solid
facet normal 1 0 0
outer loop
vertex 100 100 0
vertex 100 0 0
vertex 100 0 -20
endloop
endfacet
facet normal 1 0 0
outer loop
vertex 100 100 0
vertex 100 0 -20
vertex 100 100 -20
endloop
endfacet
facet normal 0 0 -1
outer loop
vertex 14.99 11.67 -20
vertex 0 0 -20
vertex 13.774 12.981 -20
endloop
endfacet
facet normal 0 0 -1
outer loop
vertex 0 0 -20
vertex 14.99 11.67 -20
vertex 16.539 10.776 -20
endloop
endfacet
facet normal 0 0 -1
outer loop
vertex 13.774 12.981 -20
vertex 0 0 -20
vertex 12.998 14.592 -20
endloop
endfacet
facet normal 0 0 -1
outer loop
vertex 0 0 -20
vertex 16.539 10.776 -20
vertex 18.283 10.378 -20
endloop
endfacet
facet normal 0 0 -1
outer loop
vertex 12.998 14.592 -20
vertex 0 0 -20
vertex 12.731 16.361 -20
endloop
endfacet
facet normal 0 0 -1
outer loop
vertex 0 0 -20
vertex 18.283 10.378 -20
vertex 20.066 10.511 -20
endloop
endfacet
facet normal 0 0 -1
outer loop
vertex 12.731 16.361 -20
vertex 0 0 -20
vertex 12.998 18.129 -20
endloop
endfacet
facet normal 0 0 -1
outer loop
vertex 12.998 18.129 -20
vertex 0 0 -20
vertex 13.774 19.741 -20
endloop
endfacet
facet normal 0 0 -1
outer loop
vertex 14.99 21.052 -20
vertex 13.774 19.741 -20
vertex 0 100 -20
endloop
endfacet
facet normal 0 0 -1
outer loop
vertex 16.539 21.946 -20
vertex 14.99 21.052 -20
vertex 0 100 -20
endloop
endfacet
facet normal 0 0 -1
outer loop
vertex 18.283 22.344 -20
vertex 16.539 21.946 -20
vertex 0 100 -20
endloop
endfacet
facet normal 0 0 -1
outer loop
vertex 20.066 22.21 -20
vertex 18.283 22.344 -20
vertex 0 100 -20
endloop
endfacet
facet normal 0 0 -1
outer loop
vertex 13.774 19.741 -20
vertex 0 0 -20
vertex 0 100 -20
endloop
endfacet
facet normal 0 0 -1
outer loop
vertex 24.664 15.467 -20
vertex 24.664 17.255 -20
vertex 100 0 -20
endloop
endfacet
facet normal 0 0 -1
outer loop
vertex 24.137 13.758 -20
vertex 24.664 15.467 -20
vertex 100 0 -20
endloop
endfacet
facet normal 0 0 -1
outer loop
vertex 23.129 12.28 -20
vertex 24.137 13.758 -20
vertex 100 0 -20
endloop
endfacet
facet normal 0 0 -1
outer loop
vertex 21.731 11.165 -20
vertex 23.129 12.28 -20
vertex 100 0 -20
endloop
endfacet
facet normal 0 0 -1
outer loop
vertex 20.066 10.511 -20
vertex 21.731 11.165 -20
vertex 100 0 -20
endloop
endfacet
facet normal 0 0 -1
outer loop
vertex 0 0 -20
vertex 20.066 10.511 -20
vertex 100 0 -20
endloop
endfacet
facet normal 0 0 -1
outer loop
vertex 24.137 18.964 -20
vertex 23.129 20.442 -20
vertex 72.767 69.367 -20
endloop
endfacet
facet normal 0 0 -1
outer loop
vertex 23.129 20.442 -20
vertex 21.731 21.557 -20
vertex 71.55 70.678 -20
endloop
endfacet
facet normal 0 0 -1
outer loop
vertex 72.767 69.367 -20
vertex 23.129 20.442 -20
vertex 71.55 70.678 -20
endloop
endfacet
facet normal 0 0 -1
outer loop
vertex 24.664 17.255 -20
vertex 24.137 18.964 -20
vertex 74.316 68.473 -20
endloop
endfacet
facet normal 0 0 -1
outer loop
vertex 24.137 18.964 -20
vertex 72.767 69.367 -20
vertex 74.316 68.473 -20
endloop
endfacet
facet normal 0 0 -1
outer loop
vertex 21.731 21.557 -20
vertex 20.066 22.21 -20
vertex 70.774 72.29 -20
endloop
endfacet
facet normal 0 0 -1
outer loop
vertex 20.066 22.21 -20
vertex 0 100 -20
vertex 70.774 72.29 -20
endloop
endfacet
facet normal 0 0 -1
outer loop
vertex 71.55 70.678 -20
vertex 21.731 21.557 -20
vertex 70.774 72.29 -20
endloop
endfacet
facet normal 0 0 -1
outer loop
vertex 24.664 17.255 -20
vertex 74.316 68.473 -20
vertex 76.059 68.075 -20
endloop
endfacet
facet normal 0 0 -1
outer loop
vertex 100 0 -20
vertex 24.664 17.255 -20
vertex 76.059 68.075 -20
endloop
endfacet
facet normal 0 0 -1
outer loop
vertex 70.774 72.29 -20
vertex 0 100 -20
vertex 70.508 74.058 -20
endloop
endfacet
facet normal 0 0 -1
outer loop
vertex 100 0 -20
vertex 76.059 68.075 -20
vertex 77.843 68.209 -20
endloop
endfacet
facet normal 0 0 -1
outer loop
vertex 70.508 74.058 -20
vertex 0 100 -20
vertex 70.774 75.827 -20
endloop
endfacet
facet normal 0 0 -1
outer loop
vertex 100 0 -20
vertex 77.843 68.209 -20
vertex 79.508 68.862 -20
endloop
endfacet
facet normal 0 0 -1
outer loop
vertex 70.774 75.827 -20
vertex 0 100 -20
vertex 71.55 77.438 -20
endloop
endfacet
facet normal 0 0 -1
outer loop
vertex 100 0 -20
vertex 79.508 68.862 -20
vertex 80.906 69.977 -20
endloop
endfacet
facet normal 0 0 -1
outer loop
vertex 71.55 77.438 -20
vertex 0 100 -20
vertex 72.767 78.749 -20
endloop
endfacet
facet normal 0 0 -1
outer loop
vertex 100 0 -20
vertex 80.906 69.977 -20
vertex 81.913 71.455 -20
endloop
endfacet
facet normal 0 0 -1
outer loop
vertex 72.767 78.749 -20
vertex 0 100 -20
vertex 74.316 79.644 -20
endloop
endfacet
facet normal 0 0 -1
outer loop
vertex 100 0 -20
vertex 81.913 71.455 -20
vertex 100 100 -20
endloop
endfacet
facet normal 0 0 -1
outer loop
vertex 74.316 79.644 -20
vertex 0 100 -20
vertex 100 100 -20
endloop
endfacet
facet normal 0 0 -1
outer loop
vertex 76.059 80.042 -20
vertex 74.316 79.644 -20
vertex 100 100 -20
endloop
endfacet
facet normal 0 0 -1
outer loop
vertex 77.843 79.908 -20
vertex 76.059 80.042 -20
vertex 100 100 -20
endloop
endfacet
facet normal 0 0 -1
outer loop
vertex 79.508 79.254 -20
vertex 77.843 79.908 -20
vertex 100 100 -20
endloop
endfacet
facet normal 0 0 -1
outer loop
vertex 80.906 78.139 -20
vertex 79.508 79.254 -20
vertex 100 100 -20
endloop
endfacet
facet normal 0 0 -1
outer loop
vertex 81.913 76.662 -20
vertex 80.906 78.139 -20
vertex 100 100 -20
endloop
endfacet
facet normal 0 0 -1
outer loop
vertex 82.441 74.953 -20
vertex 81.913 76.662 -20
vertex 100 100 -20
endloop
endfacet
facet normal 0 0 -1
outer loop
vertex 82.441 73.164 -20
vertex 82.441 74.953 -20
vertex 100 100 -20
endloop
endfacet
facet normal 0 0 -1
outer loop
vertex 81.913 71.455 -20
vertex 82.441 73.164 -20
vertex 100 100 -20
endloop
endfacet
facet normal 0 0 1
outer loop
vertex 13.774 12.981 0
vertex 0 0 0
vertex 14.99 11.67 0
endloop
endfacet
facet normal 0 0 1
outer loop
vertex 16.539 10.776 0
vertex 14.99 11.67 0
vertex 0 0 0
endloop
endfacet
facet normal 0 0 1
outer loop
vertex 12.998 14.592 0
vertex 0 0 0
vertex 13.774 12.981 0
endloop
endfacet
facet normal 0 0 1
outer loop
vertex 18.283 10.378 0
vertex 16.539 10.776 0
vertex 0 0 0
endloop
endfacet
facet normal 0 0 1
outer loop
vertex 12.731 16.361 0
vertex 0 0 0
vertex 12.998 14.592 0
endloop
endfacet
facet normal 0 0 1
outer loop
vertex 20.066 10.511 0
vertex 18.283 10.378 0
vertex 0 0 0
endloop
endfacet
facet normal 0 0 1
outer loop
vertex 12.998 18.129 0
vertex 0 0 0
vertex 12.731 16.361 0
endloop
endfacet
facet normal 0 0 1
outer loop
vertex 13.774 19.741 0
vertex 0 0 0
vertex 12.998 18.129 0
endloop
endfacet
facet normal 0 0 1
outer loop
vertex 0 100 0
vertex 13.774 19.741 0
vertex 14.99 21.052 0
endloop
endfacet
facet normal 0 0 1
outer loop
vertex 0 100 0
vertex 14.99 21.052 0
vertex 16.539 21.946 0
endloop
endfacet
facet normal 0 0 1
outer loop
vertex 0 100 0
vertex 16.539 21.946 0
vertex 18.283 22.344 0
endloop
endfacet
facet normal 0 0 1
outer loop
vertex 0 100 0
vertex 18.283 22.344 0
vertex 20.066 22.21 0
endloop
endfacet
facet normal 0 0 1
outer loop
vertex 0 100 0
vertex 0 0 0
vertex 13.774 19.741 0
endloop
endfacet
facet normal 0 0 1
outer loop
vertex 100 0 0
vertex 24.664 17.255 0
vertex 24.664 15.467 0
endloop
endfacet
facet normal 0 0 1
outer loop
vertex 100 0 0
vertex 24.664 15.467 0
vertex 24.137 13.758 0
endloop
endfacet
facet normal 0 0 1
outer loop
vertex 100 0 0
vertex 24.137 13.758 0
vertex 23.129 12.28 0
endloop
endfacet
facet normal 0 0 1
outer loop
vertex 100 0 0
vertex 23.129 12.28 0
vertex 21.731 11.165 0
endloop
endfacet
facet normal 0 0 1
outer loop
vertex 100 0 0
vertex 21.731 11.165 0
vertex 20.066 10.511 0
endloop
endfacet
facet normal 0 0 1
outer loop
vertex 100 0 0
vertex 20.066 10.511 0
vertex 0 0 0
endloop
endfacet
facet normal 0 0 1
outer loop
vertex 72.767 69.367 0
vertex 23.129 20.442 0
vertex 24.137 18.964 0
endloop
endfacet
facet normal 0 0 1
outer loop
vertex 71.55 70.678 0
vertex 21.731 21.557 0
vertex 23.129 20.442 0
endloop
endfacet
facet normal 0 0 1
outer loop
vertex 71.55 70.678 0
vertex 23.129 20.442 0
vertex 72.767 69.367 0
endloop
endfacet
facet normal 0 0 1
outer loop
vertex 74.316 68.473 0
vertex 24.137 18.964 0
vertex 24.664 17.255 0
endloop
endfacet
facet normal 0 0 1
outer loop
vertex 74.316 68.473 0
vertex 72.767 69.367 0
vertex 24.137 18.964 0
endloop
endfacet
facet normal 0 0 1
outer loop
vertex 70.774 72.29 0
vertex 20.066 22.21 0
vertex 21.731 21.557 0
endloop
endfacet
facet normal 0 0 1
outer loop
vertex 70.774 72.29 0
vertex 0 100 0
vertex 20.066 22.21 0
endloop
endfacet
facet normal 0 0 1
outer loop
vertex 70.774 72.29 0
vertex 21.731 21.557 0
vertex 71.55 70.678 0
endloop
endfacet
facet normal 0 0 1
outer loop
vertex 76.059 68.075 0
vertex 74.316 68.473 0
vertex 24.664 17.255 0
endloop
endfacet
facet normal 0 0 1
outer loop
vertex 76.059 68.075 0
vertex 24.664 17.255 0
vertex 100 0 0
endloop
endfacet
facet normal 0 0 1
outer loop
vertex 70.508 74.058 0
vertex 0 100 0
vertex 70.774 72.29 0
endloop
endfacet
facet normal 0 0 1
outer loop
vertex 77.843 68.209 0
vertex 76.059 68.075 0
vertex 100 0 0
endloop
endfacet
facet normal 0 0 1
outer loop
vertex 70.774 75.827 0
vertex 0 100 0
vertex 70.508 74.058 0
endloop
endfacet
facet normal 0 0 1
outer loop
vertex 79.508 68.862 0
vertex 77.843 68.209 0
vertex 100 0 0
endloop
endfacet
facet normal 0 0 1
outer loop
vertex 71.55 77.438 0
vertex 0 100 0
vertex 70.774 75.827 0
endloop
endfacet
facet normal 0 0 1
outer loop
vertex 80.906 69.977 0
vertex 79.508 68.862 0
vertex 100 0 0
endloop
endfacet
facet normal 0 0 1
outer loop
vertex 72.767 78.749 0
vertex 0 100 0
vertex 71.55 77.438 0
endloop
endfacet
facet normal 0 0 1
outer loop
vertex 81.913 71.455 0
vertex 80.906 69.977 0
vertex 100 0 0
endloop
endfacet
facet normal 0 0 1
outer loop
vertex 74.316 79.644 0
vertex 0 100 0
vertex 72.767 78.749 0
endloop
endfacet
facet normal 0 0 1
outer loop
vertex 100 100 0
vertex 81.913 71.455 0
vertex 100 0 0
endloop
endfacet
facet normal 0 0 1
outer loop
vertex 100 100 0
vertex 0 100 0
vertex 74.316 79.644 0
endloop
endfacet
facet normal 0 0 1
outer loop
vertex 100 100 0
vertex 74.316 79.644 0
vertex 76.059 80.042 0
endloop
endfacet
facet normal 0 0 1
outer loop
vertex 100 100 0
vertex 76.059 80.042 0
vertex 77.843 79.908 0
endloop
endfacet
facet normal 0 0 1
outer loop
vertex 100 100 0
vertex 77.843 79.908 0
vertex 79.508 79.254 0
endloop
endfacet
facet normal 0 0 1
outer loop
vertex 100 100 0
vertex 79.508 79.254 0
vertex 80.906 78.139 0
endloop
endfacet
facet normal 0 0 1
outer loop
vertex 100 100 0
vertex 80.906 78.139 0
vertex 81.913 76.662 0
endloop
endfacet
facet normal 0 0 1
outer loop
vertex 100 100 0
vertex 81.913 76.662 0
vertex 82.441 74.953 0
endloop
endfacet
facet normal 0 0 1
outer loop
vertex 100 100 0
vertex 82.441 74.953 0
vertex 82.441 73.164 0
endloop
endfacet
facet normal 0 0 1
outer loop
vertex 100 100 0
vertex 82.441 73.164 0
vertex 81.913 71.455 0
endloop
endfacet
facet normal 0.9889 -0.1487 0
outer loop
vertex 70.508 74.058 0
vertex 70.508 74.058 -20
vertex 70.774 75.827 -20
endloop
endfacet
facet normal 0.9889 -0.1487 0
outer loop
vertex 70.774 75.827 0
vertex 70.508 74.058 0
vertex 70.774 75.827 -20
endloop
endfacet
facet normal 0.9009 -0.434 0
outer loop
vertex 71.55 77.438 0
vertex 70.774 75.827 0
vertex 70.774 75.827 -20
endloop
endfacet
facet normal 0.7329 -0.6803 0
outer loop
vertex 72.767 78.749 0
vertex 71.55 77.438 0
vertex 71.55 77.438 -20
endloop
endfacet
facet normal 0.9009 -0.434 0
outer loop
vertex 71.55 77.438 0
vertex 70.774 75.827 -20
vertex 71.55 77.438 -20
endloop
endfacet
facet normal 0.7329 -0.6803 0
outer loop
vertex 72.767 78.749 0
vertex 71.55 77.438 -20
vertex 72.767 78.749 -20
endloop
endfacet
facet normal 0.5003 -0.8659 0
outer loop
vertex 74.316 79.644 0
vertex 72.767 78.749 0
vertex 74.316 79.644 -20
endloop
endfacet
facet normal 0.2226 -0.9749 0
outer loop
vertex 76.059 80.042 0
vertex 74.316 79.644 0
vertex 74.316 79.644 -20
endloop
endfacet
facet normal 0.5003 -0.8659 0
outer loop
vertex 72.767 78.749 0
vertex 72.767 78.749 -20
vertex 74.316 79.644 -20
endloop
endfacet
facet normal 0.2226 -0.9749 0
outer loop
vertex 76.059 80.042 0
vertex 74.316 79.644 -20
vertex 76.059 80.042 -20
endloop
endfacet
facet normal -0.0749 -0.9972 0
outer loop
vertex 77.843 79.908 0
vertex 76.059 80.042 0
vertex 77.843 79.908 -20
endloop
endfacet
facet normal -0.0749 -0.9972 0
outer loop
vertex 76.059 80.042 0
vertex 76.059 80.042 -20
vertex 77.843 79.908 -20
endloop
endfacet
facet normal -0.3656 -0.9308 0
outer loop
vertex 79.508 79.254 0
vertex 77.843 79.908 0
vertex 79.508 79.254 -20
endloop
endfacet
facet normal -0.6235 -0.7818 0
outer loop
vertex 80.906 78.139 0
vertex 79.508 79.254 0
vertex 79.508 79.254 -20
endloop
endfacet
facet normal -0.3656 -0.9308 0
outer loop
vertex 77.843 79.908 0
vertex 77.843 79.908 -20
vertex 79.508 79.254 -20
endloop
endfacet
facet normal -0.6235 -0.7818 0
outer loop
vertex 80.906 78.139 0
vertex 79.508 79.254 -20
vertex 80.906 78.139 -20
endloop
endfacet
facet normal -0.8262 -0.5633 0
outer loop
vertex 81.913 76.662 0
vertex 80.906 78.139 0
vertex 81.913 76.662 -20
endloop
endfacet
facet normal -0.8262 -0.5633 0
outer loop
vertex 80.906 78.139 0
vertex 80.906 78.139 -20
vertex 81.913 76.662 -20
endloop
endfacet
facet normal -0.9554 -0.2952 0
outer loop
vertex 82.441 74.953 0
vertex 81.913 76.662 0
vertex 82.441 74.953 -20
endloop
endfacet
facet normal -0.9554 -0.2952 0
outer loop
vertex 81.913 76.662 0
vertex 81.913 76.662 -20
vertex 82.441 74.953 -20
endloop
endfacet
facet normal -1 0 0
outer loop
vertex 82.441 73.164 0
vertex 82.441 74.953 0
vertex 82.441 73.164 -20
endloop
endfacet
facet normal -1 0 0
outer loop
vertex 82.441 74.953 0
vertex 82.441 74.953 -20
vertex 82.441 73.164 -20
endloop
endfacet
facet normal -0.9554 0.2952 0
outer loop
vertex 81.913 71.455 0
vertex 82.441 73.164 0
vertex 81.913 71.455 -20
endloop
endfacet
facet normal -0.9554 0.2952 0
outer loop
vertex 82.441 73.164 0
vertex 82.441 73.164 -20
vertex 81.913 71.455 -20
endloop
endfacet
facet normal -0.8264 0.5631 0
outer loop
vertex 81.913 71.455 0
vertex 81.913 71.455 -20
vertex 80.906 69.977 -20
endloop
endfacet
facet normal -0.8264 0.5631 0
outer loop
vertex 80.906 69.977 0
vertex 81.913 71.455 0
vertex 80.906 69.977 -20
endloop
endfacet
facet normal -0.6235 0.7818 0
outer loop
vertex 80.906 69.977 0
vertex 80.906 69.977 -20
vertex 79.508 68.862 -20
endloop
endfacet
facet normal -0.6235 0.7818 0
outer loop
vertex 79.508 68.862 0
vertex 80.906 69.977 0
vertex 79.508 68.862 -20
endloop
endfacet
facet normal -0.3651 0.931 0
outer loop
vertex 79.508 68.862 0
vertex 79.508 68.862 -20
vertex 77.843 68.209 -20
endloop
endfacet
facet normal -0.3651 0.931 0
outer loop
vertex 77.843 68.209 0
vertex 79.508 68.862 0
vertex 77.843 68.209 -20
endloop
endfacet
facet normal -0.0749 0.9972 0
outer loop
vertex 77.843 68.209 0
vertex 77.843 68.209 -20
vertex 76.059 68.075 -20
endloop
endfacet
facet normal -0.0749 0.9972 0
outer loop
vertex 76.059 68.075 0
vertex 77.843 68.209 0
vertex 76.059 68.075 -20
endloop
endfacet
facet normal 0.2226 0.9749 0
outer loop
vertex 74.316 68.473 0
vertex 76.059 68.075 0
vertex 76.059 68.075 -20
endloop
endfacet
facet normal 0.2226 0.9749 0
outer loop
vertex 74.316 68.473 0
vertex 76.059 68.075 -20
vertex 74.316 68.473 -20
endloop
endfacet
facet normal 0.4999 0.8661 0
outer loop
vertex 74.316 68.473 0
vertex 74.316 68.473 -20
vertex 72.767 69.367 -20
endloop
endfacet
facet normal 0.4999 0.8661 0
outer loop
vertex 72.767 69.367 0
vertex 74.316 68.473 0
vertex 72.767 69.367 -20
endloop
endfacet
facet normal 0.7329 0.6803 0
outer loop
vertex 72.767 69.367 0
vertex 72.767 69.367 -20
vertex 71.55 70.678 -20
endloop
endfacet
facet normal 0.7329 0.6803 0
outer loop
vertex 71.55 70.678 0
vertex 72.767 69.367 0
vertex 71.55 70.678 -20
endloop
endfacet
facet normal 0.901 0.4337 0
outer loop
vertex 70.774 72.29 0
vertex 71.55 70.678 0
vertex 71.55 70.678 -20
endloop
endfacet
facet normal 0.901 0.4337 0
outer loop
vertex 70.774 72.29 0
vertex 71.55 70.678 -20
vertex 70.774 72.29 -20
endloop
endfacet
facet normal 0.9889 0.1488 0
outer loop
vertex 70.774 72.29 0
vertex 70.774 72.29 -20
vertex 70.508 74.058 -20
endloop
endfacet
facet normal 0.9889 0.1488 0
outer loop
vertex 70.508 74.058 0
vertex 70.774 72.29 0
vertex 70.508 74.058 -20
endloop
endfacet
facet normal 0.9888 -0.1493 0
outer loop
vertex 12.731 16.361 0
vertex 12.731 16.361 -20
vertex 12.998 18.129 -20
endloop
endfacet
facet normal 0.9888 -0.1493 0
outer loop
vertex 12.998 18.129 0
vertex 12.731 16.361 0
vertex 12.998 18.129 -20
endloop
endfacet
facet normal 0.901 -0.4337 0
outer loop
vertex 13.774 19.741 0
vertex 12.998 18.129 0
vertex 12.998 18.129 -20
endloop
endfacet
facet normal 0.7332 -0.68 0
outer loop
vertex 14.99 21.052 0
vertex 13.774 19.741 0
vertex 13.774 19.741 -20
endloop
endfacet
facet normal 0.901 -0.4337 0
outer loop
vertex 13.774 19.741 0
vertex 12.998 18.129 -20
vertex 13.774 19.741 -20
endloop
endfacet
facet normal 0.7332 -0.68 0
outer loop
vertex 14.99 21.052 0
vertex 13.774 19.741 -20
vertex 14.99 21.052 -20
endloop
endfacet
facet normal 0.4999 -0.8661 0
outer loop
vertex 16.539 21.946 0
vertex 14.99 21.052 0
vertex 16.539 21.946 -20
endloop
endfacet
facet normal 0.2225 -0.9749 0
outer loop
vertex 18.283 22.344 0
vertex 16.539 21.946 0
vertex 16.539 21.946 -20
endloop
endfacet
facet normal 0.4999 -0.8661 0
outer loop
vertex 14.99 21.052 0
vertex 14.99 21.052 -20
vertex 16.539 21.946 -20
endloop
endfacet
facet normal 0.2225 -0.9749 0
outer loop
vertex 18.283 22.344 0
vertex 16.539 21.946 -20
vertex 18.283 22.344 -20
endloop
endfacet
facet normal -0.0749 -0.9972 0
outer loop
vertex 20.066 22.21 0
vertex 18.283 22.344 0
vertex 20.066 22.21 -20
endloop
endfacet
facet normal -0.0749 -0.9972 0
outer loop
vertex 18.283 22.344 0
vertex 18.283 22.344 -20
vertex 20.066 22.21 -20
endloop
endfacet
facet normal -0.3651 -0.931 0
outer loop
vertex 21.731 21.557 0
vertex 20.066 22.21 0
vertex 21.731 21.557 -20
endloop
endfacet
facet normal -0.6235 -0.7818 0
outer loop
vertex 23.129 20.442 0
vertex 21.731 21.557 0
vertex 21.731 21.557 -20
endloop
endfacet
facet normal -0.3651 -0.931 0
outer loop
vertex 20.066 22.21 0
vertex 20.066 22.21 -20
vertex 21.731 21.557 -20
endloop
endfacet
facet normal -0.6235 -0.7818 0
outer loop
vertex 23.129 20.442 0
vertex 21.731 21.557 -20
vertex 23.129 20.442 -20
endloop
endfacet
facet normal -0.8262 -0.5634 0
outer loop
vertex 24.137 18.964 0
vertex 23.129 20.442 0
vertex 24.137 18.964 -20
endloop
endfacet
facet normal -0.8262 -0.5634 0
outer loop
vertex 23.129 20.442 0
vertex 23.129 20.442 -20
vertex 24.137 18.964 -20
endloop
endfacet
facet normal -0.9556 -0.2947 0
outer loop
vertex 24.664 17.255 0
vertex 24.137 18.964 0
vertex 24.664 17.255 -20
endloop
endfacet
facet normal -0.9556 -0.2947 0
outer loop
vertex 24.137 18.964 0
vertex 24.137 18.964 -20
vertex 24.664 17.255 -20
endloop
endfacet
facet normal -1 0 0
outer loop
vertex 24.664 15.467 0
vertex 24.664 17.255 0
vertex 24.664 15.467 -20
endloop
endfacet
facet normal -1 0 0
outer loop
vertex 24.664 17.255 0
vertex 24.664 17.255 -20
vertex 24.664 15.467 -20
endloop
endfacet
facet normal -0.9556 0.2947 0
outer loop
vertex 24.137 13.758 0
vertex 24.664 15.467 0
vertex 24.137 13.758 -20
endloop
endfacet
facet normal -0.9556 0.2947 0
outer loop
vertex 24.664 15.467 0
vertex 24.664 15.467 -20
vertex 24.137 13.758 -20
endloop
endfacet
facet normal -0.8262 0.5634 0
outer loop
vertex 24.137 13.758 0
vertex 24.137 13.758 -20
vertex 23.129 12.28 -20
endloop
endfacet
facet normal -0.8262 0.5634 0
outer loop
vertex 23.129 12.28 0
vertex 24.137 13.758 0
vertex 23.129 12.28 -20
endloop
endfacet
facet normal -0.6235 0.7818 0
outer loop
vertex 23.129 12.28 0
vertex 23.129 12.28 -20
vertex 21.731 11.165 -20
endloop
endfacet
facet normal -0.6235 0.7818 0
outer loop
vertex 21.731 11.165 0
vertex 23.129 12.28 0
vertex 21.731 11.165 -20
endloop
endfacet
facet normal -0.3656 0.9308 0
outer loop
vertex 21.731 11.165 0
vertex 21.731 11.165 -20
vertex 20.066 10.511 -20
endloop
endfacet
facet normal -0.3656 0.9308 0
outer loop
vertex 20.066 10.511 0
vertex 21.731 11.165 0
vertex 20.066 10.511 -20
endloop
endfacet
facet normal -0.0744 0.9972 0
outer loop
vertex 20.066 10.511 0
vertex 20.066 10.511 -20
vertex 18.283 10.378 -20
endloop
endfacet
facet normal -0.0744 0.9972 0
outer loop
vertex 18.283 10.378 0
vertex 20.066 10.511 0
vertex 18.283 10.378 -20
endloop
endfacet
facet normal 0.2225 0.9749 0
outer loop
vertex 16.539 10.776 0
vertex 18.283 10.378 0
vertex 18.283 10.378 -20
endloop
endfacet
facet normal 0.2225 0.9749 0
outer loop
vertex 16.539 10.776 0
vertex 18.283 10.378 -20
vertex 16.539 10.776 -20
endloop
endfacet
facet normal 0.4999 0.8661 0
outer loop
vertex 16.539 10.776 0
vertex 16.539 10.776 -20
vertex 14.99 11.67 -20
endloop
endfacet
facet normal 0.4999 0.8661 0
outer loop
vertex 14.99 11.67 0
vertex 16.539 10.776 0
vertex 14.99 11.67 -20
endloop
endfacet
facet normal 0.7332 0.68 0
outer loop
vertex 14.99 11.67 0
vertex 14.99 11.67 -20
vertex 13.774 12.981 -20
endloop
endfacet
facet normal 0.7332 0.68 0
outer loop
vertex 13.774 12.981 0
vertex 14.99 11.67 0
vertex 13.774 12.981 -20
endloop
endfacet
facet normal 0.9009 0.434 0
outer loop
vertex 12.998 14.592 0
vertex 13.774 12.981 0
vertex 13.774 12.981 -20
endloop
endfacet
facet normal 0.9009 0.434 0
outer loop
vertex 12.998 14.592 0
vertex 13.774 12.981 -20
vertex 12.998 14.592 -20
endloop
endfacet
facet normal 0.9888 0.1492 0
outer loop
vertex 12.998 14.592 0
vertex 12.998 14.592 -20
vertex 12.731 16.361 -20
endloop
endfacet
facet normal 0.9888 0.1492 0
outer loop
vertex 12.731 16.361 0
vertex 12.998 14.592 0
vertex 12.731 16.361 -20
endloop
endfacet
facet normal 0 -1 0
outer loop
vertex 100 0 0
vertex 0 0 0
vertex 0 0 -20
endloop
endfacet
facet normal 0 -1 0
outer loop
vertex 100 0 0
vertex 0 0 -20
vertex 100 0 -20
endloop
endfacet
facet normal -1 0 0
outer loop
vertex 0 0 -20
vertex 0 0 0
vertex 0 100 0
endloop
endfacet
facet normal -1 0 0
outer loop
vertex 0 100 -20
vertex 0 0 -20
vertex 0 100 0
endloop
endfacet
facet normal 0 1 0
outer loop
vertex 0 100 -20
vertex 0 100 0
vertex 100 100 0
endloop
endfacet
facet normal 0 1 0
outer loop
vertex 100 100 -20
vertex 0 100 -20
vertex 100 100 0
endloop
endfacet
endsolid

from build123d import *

# Parameters (mm, degrees)
SKETCH1_W                  = 100
SKETCH1_H                  = 100
BOSS_EXTRUDE1_DEPTH        = 20
F_12_0_12_DIAMETER_HOLE1_D = 12


with BuildPart() as part:
    # Sketch1 → Boss-Extrude1 (new body)
    with BuildSketch(Plane.XY):
        with Locations((50, 50)):
            Rectangle(SKETCH1_W, SKETCH1_H)
    extrude(amount=-BOSS_EXTRUDE1_DEPTH)

    # Ø12.0 (12) Diameter Hole1 (through all)
    with Locations(Plane.XY):
        with Locations((18.730975853, 16.360822488), (76.507609659, 74.058277502)):
            Hole(F_12_0_12_DIAMETER_HOLE1_D / 2)


solid = part.part
